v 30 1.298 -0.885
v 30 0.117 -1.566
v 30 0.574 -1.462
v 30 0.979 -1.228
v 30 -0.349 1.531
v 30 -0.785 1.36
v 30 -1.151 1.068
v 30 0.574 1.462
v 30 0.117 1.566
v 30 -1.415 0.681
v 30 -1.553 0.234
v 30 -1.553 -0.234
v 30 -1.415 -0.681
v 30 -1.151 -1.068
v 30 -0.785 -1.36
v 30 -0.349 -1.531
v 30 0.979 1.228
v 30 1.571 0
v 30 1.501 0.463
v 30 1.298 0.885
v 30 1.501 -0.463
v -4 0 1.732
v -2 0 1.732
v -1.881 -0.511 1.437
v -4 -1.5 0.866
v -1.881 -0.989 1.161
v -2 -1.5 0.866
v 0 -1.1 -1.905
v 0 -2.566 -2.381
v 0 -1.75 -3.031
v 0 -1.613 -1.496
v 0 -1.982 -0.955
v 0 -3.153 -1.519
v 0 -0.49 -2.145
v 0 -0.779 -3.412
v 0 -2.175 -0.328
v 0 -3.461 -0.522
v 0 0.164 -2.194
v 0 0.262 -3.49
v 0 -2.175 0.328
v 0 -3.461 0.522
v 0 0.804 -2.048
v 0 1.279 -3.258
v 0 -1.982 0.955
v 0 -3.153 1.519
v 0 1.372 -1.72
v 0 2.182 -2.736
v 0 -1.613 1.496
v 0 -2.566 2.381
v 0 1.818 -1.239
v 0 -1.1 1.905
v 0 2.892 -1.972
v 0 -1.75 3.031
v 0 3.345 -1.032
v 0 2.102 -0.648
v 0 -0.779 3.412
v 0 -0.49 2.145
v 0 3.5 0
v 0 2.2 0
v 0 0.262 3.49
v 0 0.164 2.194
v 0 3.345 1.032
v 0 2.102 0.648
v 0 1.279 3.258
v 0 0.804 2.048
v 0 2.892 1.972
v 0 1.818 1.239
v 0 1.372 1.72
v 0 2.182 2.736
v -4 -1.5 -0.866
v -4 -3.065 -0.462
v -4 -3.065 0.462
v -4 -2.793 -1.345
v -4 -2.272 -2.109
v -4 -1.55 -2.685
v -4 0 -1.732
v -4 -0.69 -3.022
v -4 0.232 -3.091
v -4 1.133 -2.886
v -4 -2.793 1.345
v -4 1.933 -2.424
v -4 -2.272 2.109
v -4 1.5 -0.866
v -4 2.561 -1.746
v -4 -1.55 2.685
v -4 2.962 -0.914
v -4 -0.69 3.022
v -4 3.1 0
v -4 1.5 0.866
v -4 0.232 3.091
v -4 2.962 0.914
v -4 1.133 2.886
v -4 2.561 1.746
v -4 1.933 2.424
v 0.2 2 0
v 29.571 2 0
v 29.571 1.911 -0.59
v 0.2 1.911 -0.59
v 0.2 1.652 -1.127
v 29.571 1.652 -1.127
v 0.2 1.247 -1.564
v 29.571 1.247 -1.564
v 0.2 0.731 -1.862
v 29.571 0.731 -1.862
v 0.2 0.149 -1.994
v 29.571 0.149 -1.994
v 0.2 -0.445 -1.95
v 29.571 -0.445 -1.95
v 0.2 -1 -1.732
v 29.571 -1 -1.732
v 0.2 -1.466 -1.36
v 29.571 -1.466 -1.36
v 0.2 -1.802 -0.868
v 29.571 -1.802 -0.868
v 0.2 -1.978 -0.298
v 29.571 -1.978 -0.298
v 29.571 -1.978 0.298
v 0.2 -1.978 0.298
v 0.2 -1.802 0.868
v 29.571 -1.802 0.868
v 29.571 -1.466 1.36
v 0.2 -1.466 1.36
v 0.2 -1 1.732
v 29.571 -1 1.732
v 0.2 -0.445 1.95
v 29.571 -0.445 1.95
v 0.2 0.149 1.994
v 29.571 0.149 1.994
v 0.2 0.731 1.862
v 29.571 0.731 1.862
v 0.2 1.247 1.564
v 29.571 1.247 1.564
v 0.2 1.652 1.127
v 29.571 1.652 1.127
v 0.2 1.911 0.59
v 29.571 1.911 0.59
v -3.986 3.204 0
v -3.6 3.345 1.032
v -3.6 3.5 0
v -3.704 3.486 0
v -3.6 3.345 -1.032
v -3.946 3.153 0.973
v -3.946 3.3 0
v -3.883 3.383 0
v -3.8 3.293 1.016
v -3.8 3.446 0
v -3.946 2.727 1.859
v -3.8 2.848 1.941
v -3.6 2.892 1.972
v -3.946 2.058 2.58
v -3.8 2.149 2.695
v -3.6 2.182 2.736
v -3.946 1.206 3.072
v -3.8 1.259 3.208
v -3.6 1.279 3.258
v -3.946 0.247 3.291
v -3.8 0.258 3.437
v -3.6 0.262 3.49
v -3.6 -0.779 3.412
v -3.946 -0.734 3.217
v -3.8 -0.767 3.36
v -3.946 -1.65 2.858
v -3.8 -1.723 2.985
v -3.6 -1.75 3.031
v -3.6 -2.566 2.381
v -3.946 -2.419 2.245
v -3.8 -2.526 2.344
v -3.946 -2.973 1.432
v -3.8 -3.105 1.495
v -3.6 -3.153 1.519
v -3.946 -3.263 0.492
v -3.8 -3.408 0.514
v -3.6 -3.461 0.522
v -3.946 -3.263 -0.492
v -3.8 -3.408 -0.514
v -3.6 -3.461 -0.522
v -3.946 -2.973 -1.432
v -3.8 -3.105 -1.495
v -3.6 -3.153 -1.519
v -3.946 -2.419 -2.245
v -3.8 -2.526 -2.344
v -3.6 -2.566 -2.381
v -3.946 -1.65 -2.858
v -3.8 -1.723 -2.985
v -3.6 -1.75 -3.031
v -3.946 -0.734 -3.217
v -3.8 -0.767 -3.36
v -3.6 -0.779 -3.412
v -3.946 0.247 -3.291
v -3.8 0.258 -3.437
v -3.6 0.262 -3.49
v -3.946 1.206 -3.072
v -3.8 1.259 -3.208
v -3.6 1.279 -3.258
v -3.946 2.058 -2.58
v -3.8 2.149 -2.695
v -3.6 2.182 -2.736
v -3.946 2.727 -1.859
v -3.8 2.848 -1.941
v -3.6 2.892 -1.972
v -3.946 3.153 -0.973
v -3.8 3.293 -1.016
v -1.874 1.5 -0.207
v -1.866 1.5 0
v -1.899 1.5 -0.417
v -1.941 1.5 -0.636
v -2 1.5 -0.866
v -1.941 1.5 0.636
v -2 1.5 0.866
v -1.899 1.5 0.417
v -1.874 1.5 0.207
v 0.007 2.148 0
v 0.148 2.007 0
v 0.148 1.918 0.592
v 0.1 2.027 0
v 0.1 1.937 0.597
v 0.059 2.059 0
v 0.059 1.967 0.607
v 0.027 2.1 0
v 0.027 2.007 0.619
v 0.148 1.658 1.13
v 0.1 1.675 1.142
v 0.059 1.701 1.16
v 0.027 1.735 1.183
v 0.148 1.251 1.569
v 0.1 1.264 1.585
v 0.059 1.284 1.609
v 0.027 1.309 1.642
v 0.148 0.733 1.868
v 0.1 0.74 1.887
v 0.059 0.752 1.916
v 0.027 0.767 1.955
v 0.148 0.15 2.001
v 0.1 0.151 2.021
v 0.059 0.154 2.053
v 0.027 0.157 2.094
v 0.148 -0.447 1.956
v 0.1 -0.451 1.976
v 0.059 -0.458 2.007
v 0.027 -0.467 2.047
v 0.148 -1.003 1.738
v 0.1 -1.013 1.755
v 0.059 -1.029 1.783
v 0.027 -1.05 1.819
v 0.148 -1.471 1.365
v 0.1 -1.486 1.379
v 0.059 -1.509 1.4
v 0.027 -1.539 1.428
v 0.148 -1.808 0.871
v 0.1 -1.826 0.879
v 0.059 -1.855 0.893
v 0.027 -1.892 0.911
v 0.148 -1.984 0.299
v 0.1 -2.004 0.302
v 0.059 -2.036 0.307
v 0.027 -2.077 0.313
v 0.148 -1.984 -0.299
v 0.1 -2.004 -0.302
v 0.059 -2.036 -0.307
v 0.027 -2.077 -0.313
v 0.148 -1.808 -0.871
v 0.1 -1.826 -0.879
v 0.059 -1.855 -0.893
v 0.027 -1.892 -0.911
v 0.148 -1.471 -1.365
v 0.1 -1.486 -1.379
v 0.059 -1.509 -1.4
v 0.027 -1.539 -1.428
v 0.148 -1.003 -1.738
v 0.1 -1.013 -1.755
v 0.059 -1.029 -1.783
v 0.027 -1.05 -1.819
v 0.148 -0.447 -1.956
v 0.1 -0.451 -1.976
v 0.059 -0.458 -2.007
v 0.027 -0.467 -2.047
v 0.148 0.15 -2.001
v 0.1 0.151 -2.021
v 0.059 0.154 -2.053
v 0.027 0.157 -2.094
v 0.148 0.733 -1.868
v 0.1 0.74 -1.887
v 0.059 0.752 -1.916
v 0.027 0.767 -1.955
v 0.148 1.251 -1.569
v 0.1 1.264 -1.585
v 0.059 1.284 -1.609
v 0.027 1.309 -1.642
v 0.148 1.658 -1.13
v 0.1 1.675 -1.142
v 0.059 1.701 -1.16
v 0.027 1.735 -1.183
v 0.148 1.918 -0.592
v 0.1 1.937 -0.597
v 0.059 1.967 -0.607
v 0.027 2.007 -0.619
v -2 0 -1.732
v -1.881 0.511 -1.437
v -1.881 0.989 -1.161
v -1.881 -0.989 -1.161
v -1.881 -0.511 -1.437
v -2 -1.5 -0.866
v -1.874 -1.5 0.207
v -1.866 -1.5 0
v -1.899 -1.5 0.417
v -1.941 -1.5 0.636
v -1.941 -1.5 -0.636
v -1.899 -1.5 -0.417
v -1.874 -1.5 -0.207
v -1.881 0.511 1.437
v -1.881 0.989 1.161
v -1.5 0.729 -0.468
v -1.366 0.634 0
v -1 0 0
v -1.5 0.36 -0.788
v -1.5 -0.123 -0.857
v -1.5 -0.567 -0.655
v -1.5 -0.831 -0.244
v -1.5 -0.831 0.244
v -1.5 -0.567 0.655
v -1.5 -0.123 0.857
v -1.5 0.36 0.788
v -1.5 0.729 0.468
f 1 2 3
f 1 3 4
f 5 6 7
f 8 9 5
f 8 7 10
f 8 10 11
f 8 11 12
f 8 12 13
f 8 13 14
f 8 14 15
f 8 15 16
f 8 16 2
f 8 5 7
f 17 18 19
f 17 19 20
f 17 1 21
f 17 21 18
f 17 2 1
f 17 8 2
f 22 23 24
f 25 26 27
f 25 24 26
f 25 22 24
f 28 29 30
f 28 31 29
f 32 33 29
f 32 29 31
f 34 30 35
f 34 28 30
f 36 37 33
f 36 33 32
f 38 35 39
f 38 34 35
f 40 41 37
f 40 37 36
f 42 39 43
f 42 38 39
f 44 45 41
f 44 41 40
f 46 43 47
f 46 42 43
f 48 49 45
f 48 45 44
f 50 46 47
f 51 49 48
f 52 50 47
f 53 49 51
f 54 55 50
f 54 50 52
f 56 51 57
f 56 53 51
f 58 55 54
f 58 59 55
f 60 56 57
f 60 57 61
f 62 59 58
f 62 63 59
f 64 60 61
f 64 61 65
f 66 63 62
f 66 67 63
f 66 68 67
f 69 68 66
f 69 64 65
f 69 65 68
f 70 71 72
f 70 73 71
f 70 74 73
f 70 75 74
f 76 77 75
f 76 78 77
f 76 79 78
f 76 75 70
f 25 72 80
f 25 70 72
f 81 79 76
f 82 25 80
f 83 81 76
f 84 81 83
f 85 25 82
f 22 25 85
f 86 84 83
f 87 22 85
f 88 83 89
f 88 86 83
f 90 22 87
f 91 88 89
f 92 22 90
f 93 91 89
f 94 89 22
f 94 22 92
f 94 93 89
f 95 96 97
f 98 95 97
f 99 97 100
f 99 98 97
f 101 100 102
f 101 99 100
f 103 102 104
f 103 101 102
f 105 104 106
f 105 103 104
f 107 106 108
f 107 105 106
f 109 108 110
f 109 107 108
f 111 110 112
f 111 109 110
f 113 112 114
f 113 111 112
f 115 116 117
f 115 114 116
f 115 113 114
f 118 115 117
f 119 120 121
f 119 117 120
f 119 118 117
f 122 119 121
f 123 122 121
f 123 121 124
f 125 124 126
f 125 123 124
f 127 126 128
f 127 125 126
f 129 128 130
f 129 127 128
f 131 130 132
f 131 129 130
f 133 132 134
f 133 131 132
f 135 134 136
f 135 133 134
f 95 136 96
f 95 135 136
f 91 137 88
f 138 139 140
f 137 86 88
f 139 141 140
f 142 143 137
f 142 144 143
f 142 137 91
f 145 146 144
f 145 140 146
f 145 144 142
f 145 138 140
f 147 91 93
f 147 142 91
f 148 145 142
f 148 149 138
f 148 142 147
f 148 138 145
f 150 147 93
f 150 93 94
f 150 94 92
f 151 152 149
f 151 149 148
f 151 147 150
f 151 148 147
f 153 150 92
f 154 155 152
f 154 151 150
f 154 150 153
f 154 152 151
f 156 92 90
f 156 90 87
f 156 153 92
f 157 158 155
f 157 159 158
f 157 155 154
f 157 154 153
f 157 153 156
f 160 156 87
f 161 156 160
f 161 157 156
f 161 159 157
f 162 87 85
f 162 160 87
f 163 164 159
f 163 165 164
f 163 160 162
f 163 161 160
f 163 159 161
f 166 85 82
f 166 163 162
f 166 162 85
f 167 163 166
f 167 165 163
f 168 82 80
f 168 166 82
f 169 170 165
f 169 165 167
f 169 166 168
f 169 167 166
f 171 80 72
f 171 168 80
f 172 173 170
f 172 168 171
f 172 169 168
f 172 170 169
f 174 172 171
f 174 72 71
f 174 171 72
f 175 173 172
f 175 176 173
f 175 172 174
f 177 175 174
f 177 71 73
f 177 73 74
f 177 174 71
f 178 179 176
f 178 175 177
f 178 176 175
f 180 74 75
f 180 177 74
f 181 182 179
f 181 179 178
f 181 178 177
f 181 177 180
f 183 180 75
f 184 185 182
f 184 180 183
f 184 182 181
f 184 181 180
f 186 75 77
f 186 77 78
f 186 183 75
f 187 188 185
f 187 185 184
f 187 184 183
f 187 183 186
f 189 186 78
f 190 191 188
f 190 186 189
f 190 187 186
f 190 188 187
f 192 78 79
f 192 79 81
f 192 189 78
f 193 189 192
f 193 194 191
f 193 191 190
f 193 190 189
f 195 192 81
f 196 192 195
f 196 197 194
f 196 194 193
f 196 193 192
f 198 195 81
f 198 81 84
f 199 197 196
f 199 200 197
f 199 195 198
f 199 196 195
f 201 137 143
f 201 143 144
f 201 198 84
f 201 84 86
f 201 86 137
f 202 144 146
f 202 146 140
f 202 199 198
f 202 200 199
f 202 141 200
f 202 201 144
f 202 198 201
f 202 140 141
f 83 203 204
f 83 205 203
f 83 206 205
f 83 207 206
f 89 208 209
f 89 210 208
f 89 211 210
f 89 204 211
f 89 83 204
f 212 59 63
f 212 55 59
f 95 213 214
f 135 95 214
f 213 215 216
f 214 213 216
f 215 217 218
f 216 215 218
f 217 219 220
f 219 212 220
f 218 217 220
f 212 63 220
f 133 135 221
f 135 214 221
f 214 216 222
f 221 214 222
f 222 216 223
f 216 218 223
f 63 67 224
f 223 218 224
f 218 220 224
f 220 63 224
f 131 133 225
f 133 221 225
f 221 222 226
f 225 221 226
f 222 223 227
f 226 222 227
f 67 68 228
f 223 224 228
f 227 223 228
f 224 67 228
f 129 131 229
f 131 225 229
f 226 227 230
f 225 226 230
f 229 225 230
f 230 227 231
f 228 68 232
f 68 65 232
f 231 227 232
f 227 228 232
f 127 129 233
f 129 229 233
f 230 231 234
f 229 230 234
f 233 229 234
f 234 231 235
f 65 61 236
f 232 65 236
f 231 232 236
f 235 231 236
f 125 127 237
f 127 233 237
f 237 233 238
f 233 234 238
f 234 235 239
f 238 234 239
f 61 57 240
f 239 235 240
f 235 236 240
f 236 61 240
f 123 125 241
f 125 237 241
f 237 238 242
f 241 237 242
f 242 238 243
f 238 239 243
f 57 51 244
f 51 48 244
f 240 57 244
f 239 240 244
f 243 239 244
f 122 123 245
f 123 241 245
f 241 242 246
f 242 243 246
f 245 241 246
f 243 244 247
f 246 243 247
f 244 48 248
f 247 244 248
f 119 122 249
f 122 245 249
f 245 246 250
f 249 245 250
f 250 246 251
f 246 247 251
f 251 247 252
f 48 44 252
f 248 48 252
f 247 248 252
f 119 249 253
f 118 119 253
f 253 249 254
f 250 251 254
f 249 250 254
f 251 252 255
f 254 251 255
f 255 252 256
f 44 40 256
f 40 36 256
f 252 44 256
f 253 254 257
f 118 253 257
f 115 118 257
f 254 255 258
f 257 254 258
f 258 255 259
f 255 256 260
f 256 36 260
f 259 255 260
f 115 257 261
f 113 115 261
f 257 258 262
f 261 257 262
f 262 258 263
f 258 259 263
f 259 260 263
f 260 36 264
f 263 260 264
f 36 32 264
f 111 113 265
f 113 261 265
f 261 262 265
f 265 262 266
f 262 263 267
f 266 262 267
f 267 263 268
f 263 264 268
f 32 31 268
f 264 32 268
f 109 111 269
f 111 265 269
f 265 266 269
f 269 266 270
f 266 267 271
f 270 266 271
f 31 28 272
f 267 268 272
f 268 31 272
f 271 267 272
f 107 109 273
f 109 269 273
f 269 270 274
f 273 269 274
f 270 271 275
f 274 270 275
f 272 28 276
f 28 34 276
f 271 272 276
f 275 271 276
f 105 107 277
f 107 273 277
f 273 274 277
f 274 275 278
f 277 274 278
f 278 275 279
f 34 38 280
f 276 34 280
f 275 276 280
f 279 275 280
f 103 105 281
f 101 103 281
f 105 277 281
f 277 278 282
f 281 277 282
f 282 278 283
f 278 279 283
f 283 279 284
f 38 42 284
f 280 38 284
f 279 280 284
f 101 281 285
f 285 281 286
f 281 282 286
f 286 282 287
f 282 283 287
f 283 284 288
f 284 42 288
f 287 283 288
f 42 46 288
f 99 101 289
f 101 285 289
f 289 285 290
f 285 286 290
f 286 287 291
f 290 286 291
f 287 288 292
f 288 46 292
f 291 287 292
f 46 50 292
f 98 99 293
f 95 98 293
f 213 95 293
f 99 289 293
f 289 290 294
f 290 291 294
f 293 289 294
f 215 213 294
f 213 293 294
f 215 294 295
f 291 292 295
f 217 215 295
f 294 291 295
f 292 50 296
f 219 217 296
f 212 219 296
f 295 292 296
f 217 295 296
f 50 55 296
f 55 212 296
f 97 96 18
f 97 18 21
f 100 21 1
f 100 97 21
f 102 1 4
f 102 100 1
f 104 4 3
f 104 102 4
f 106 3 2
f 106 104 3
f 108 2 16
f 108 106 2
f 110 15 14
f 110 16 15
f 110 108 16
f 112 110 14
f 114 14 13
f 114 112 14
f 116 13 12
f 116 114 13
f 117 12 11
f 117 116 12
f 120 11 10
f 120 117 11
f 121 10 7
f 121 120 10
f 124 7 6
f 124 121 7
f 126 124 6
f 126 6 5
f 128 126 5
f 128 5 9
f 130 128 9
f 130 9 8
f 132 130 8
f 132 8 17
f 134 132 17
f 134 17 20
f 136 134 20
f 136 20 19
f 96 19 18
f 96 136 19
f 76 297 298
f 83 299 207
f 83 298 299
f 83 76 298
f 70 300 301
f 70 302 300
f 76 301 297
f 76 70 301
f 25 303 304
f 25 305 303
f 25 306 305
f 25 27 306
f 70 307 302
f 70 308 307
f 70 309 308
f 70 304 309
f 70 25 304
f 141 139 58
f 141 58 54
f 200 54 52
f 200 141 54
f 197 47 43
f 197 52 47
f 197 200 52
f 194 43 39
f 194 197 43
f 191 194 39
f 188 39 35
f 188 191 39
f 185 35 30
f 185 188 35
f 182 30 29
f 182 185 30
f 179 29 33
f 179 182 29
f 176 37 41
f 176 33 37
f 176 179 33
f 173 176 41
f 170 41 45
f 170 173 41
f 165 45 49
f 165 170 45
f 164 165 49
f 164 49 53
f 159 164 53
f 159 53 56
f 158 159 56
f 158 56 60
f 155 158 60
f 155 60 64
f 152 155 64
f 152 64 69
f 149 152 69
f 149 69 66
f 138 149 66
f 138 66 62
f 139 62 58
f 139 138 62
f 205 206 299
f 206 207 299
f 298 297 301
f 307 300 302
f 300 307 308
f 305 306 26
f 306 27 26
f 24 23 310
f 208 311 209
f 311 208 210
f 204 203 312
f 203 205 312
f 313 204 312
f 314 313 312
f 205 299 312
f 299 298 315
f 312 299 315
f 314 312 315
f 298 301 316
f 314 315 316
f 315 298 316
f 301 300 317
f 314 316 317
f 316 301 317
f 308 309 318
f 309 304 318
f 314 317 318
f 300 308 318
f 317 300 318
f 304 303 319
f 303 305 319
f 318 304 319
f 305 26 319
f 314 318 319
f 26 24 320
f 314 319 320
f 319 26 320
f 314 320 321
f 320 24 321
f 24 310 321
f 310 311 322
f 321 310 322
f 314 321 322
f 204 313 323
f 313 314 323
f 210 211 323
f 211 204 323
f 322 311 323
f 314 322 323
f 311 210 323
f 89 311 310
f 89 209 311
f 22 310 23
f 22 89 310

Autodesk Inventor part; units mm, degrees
ref_plane "YZ Plane" through (0, 0, 0) normal (1, 0, 0) x (0, 1, 0)
ref_plane "XZ Plane" through (0, 0, 0) normal (0, 1, 0) x (-1, 0, 0)
sketch "Skizze1" plane through (0, 0, 0) normal (0, 0, 1) x (1, 0, 0)
  line L0 (-1, 0) -> (30, 0)
  line L1 (30, 0) -> (30, 2)
  line L2 (30, 2) -> (10, 2)
  line L3 (10, 2) -> (9.5705, 2)
  line L4 (9.5705, 2) -> (0, 2)
  line L5 (0, 2) -> (0, 3.5)
  line L6 (0, 3.5) -> (-4, 3.5)
  line L7 (-4, 3.5) -> (-4, 1.7321)
  line L8 (-4, 1.7321) -> (-2, 1.7321)
  line L9 (-2, 1.7321) -> (-1, 0)
  line L10 (-10.8, 0) -> (36.8, 0) projected
  line L11 (0, -0.7) -> (0, 4.2) projected
  line L12 (10, 2) -> (0, 2) construction
  dimension "d1" = 20
  dimension "d2" = 0.4295
  dimension "d3" = 4
  dimension "d4" = 2
  dimension "d5" = 60
  dimension "d6" = 4
  dimension "d7" = 4
  dimension "d8" = 3.4641
  dimension "d9" = 7
  dimension "d26" = 30
revolve "Körper" add sketch "Skizze1" angle 360 about axis through (-1, 0, 0) along (1, 0, 0)
sketch "Skizze2" plane through (-4, 0, 0) normal (-1, 0, 0) x (0, 0, 1)
  circle A0 centre (0, 0) radius 1.7321 projected
  line L0 (0, -4.9) -> (0, 4.9) projected
  line L1 (-4.9, 0) -> (4.9, 0) projected
  line L2 (1.7321, 0) -> (0.866, -1.5)
  line L3 (0.866, -1.5) -> (-0.866, -1.5)
  line L4 (-0.866, -1.5) -> (-1.7321, 0)
  line L5 (-1.7321, 0) -> (-0.866, 1.5)
  line L6 (-0.866, 1.5) -> (0.866, 1.5)
  line L7 (0.866, 1.5) -> (1.7321, 0)
extrude "Loch" add sketch "Skizze2" against normal up to next contours L7 A0 | A0 L2 | L6 L0 A0 | A0 L0 L3 | L0 L6 A0 | A0 L3 L0 | L4 A0 | A0 L5
fillet "Rundung1" radius 0.4 1 edges at (-4, -3.5, 0)
thread "Gewinde" size "M4x0.7" class "6g" standard "ISO Metric profile" length 20
chamfer "Fase1" distance 0.4294 distance2 0.4294 1 edges at (30, -2, 0) measured on face at (30, 0.0262, -0.4421)
ref_plane "Work Plane1" through (29, 0, 0) normal (0, -1, 0) x (1, 0, 0)
fillet "Fillet2" radius 0.2 1 edges at (0, -2, 0)
equation "\"d1\" = GEL"
equation "\"d3\" = KOH"
equation "\"d4\" = INTI"
equation "\"d6\" = GD"
equation "\"d7\" = BDM"
equation "\"d8\" = 1.1547 * SW"
equation "\"d9\" = KOD"
equation "\"d26\" = NLG"
equation "\"d30\" = R"
equation "\"d17\" = RR"
equation "\"d13\" = GEL"
equation "\"d15\" = -0.5 * SPD + 0.5 * GD"
equation "\"d16\" = GUL"
equation "\"GD\" = NND"
equation "\"NLG\" = 30"
equation "\"GEL\" = 20"
equation "\"KOD\" = 7"
equation "\"KOH\" = 4"
equation "\"INTI\" = 2"
equation "\"GAL\" = 0.61345 * PTC"
equation "\"GUL\" = 0.61345 * PTC"
equation "\"BDM\" = NND"
equation "\"SW\" = 3"
equation "\"RR\" = 0.4"
equation "\"SPD\" = NND - 1.2269 * PTC"
equation "\"R\" = 0.2"
equation "\"TOA\" = 30deg"
equation "\"GD1\" = THREADDIA - 1.2269 * PTC"
equation "\"THREADDIA\" = 4"
equation "\"FAWI\" = 45deg"
equation "\"ANG\" = 120deg"
equation "\"PTC\" = 0.7"
equation "\"NND\" = 4"
equation "\"E0\" = 1.155 * SW"
properties part number "DIN 912 - M4 x 30" material "Stahl, weich"
